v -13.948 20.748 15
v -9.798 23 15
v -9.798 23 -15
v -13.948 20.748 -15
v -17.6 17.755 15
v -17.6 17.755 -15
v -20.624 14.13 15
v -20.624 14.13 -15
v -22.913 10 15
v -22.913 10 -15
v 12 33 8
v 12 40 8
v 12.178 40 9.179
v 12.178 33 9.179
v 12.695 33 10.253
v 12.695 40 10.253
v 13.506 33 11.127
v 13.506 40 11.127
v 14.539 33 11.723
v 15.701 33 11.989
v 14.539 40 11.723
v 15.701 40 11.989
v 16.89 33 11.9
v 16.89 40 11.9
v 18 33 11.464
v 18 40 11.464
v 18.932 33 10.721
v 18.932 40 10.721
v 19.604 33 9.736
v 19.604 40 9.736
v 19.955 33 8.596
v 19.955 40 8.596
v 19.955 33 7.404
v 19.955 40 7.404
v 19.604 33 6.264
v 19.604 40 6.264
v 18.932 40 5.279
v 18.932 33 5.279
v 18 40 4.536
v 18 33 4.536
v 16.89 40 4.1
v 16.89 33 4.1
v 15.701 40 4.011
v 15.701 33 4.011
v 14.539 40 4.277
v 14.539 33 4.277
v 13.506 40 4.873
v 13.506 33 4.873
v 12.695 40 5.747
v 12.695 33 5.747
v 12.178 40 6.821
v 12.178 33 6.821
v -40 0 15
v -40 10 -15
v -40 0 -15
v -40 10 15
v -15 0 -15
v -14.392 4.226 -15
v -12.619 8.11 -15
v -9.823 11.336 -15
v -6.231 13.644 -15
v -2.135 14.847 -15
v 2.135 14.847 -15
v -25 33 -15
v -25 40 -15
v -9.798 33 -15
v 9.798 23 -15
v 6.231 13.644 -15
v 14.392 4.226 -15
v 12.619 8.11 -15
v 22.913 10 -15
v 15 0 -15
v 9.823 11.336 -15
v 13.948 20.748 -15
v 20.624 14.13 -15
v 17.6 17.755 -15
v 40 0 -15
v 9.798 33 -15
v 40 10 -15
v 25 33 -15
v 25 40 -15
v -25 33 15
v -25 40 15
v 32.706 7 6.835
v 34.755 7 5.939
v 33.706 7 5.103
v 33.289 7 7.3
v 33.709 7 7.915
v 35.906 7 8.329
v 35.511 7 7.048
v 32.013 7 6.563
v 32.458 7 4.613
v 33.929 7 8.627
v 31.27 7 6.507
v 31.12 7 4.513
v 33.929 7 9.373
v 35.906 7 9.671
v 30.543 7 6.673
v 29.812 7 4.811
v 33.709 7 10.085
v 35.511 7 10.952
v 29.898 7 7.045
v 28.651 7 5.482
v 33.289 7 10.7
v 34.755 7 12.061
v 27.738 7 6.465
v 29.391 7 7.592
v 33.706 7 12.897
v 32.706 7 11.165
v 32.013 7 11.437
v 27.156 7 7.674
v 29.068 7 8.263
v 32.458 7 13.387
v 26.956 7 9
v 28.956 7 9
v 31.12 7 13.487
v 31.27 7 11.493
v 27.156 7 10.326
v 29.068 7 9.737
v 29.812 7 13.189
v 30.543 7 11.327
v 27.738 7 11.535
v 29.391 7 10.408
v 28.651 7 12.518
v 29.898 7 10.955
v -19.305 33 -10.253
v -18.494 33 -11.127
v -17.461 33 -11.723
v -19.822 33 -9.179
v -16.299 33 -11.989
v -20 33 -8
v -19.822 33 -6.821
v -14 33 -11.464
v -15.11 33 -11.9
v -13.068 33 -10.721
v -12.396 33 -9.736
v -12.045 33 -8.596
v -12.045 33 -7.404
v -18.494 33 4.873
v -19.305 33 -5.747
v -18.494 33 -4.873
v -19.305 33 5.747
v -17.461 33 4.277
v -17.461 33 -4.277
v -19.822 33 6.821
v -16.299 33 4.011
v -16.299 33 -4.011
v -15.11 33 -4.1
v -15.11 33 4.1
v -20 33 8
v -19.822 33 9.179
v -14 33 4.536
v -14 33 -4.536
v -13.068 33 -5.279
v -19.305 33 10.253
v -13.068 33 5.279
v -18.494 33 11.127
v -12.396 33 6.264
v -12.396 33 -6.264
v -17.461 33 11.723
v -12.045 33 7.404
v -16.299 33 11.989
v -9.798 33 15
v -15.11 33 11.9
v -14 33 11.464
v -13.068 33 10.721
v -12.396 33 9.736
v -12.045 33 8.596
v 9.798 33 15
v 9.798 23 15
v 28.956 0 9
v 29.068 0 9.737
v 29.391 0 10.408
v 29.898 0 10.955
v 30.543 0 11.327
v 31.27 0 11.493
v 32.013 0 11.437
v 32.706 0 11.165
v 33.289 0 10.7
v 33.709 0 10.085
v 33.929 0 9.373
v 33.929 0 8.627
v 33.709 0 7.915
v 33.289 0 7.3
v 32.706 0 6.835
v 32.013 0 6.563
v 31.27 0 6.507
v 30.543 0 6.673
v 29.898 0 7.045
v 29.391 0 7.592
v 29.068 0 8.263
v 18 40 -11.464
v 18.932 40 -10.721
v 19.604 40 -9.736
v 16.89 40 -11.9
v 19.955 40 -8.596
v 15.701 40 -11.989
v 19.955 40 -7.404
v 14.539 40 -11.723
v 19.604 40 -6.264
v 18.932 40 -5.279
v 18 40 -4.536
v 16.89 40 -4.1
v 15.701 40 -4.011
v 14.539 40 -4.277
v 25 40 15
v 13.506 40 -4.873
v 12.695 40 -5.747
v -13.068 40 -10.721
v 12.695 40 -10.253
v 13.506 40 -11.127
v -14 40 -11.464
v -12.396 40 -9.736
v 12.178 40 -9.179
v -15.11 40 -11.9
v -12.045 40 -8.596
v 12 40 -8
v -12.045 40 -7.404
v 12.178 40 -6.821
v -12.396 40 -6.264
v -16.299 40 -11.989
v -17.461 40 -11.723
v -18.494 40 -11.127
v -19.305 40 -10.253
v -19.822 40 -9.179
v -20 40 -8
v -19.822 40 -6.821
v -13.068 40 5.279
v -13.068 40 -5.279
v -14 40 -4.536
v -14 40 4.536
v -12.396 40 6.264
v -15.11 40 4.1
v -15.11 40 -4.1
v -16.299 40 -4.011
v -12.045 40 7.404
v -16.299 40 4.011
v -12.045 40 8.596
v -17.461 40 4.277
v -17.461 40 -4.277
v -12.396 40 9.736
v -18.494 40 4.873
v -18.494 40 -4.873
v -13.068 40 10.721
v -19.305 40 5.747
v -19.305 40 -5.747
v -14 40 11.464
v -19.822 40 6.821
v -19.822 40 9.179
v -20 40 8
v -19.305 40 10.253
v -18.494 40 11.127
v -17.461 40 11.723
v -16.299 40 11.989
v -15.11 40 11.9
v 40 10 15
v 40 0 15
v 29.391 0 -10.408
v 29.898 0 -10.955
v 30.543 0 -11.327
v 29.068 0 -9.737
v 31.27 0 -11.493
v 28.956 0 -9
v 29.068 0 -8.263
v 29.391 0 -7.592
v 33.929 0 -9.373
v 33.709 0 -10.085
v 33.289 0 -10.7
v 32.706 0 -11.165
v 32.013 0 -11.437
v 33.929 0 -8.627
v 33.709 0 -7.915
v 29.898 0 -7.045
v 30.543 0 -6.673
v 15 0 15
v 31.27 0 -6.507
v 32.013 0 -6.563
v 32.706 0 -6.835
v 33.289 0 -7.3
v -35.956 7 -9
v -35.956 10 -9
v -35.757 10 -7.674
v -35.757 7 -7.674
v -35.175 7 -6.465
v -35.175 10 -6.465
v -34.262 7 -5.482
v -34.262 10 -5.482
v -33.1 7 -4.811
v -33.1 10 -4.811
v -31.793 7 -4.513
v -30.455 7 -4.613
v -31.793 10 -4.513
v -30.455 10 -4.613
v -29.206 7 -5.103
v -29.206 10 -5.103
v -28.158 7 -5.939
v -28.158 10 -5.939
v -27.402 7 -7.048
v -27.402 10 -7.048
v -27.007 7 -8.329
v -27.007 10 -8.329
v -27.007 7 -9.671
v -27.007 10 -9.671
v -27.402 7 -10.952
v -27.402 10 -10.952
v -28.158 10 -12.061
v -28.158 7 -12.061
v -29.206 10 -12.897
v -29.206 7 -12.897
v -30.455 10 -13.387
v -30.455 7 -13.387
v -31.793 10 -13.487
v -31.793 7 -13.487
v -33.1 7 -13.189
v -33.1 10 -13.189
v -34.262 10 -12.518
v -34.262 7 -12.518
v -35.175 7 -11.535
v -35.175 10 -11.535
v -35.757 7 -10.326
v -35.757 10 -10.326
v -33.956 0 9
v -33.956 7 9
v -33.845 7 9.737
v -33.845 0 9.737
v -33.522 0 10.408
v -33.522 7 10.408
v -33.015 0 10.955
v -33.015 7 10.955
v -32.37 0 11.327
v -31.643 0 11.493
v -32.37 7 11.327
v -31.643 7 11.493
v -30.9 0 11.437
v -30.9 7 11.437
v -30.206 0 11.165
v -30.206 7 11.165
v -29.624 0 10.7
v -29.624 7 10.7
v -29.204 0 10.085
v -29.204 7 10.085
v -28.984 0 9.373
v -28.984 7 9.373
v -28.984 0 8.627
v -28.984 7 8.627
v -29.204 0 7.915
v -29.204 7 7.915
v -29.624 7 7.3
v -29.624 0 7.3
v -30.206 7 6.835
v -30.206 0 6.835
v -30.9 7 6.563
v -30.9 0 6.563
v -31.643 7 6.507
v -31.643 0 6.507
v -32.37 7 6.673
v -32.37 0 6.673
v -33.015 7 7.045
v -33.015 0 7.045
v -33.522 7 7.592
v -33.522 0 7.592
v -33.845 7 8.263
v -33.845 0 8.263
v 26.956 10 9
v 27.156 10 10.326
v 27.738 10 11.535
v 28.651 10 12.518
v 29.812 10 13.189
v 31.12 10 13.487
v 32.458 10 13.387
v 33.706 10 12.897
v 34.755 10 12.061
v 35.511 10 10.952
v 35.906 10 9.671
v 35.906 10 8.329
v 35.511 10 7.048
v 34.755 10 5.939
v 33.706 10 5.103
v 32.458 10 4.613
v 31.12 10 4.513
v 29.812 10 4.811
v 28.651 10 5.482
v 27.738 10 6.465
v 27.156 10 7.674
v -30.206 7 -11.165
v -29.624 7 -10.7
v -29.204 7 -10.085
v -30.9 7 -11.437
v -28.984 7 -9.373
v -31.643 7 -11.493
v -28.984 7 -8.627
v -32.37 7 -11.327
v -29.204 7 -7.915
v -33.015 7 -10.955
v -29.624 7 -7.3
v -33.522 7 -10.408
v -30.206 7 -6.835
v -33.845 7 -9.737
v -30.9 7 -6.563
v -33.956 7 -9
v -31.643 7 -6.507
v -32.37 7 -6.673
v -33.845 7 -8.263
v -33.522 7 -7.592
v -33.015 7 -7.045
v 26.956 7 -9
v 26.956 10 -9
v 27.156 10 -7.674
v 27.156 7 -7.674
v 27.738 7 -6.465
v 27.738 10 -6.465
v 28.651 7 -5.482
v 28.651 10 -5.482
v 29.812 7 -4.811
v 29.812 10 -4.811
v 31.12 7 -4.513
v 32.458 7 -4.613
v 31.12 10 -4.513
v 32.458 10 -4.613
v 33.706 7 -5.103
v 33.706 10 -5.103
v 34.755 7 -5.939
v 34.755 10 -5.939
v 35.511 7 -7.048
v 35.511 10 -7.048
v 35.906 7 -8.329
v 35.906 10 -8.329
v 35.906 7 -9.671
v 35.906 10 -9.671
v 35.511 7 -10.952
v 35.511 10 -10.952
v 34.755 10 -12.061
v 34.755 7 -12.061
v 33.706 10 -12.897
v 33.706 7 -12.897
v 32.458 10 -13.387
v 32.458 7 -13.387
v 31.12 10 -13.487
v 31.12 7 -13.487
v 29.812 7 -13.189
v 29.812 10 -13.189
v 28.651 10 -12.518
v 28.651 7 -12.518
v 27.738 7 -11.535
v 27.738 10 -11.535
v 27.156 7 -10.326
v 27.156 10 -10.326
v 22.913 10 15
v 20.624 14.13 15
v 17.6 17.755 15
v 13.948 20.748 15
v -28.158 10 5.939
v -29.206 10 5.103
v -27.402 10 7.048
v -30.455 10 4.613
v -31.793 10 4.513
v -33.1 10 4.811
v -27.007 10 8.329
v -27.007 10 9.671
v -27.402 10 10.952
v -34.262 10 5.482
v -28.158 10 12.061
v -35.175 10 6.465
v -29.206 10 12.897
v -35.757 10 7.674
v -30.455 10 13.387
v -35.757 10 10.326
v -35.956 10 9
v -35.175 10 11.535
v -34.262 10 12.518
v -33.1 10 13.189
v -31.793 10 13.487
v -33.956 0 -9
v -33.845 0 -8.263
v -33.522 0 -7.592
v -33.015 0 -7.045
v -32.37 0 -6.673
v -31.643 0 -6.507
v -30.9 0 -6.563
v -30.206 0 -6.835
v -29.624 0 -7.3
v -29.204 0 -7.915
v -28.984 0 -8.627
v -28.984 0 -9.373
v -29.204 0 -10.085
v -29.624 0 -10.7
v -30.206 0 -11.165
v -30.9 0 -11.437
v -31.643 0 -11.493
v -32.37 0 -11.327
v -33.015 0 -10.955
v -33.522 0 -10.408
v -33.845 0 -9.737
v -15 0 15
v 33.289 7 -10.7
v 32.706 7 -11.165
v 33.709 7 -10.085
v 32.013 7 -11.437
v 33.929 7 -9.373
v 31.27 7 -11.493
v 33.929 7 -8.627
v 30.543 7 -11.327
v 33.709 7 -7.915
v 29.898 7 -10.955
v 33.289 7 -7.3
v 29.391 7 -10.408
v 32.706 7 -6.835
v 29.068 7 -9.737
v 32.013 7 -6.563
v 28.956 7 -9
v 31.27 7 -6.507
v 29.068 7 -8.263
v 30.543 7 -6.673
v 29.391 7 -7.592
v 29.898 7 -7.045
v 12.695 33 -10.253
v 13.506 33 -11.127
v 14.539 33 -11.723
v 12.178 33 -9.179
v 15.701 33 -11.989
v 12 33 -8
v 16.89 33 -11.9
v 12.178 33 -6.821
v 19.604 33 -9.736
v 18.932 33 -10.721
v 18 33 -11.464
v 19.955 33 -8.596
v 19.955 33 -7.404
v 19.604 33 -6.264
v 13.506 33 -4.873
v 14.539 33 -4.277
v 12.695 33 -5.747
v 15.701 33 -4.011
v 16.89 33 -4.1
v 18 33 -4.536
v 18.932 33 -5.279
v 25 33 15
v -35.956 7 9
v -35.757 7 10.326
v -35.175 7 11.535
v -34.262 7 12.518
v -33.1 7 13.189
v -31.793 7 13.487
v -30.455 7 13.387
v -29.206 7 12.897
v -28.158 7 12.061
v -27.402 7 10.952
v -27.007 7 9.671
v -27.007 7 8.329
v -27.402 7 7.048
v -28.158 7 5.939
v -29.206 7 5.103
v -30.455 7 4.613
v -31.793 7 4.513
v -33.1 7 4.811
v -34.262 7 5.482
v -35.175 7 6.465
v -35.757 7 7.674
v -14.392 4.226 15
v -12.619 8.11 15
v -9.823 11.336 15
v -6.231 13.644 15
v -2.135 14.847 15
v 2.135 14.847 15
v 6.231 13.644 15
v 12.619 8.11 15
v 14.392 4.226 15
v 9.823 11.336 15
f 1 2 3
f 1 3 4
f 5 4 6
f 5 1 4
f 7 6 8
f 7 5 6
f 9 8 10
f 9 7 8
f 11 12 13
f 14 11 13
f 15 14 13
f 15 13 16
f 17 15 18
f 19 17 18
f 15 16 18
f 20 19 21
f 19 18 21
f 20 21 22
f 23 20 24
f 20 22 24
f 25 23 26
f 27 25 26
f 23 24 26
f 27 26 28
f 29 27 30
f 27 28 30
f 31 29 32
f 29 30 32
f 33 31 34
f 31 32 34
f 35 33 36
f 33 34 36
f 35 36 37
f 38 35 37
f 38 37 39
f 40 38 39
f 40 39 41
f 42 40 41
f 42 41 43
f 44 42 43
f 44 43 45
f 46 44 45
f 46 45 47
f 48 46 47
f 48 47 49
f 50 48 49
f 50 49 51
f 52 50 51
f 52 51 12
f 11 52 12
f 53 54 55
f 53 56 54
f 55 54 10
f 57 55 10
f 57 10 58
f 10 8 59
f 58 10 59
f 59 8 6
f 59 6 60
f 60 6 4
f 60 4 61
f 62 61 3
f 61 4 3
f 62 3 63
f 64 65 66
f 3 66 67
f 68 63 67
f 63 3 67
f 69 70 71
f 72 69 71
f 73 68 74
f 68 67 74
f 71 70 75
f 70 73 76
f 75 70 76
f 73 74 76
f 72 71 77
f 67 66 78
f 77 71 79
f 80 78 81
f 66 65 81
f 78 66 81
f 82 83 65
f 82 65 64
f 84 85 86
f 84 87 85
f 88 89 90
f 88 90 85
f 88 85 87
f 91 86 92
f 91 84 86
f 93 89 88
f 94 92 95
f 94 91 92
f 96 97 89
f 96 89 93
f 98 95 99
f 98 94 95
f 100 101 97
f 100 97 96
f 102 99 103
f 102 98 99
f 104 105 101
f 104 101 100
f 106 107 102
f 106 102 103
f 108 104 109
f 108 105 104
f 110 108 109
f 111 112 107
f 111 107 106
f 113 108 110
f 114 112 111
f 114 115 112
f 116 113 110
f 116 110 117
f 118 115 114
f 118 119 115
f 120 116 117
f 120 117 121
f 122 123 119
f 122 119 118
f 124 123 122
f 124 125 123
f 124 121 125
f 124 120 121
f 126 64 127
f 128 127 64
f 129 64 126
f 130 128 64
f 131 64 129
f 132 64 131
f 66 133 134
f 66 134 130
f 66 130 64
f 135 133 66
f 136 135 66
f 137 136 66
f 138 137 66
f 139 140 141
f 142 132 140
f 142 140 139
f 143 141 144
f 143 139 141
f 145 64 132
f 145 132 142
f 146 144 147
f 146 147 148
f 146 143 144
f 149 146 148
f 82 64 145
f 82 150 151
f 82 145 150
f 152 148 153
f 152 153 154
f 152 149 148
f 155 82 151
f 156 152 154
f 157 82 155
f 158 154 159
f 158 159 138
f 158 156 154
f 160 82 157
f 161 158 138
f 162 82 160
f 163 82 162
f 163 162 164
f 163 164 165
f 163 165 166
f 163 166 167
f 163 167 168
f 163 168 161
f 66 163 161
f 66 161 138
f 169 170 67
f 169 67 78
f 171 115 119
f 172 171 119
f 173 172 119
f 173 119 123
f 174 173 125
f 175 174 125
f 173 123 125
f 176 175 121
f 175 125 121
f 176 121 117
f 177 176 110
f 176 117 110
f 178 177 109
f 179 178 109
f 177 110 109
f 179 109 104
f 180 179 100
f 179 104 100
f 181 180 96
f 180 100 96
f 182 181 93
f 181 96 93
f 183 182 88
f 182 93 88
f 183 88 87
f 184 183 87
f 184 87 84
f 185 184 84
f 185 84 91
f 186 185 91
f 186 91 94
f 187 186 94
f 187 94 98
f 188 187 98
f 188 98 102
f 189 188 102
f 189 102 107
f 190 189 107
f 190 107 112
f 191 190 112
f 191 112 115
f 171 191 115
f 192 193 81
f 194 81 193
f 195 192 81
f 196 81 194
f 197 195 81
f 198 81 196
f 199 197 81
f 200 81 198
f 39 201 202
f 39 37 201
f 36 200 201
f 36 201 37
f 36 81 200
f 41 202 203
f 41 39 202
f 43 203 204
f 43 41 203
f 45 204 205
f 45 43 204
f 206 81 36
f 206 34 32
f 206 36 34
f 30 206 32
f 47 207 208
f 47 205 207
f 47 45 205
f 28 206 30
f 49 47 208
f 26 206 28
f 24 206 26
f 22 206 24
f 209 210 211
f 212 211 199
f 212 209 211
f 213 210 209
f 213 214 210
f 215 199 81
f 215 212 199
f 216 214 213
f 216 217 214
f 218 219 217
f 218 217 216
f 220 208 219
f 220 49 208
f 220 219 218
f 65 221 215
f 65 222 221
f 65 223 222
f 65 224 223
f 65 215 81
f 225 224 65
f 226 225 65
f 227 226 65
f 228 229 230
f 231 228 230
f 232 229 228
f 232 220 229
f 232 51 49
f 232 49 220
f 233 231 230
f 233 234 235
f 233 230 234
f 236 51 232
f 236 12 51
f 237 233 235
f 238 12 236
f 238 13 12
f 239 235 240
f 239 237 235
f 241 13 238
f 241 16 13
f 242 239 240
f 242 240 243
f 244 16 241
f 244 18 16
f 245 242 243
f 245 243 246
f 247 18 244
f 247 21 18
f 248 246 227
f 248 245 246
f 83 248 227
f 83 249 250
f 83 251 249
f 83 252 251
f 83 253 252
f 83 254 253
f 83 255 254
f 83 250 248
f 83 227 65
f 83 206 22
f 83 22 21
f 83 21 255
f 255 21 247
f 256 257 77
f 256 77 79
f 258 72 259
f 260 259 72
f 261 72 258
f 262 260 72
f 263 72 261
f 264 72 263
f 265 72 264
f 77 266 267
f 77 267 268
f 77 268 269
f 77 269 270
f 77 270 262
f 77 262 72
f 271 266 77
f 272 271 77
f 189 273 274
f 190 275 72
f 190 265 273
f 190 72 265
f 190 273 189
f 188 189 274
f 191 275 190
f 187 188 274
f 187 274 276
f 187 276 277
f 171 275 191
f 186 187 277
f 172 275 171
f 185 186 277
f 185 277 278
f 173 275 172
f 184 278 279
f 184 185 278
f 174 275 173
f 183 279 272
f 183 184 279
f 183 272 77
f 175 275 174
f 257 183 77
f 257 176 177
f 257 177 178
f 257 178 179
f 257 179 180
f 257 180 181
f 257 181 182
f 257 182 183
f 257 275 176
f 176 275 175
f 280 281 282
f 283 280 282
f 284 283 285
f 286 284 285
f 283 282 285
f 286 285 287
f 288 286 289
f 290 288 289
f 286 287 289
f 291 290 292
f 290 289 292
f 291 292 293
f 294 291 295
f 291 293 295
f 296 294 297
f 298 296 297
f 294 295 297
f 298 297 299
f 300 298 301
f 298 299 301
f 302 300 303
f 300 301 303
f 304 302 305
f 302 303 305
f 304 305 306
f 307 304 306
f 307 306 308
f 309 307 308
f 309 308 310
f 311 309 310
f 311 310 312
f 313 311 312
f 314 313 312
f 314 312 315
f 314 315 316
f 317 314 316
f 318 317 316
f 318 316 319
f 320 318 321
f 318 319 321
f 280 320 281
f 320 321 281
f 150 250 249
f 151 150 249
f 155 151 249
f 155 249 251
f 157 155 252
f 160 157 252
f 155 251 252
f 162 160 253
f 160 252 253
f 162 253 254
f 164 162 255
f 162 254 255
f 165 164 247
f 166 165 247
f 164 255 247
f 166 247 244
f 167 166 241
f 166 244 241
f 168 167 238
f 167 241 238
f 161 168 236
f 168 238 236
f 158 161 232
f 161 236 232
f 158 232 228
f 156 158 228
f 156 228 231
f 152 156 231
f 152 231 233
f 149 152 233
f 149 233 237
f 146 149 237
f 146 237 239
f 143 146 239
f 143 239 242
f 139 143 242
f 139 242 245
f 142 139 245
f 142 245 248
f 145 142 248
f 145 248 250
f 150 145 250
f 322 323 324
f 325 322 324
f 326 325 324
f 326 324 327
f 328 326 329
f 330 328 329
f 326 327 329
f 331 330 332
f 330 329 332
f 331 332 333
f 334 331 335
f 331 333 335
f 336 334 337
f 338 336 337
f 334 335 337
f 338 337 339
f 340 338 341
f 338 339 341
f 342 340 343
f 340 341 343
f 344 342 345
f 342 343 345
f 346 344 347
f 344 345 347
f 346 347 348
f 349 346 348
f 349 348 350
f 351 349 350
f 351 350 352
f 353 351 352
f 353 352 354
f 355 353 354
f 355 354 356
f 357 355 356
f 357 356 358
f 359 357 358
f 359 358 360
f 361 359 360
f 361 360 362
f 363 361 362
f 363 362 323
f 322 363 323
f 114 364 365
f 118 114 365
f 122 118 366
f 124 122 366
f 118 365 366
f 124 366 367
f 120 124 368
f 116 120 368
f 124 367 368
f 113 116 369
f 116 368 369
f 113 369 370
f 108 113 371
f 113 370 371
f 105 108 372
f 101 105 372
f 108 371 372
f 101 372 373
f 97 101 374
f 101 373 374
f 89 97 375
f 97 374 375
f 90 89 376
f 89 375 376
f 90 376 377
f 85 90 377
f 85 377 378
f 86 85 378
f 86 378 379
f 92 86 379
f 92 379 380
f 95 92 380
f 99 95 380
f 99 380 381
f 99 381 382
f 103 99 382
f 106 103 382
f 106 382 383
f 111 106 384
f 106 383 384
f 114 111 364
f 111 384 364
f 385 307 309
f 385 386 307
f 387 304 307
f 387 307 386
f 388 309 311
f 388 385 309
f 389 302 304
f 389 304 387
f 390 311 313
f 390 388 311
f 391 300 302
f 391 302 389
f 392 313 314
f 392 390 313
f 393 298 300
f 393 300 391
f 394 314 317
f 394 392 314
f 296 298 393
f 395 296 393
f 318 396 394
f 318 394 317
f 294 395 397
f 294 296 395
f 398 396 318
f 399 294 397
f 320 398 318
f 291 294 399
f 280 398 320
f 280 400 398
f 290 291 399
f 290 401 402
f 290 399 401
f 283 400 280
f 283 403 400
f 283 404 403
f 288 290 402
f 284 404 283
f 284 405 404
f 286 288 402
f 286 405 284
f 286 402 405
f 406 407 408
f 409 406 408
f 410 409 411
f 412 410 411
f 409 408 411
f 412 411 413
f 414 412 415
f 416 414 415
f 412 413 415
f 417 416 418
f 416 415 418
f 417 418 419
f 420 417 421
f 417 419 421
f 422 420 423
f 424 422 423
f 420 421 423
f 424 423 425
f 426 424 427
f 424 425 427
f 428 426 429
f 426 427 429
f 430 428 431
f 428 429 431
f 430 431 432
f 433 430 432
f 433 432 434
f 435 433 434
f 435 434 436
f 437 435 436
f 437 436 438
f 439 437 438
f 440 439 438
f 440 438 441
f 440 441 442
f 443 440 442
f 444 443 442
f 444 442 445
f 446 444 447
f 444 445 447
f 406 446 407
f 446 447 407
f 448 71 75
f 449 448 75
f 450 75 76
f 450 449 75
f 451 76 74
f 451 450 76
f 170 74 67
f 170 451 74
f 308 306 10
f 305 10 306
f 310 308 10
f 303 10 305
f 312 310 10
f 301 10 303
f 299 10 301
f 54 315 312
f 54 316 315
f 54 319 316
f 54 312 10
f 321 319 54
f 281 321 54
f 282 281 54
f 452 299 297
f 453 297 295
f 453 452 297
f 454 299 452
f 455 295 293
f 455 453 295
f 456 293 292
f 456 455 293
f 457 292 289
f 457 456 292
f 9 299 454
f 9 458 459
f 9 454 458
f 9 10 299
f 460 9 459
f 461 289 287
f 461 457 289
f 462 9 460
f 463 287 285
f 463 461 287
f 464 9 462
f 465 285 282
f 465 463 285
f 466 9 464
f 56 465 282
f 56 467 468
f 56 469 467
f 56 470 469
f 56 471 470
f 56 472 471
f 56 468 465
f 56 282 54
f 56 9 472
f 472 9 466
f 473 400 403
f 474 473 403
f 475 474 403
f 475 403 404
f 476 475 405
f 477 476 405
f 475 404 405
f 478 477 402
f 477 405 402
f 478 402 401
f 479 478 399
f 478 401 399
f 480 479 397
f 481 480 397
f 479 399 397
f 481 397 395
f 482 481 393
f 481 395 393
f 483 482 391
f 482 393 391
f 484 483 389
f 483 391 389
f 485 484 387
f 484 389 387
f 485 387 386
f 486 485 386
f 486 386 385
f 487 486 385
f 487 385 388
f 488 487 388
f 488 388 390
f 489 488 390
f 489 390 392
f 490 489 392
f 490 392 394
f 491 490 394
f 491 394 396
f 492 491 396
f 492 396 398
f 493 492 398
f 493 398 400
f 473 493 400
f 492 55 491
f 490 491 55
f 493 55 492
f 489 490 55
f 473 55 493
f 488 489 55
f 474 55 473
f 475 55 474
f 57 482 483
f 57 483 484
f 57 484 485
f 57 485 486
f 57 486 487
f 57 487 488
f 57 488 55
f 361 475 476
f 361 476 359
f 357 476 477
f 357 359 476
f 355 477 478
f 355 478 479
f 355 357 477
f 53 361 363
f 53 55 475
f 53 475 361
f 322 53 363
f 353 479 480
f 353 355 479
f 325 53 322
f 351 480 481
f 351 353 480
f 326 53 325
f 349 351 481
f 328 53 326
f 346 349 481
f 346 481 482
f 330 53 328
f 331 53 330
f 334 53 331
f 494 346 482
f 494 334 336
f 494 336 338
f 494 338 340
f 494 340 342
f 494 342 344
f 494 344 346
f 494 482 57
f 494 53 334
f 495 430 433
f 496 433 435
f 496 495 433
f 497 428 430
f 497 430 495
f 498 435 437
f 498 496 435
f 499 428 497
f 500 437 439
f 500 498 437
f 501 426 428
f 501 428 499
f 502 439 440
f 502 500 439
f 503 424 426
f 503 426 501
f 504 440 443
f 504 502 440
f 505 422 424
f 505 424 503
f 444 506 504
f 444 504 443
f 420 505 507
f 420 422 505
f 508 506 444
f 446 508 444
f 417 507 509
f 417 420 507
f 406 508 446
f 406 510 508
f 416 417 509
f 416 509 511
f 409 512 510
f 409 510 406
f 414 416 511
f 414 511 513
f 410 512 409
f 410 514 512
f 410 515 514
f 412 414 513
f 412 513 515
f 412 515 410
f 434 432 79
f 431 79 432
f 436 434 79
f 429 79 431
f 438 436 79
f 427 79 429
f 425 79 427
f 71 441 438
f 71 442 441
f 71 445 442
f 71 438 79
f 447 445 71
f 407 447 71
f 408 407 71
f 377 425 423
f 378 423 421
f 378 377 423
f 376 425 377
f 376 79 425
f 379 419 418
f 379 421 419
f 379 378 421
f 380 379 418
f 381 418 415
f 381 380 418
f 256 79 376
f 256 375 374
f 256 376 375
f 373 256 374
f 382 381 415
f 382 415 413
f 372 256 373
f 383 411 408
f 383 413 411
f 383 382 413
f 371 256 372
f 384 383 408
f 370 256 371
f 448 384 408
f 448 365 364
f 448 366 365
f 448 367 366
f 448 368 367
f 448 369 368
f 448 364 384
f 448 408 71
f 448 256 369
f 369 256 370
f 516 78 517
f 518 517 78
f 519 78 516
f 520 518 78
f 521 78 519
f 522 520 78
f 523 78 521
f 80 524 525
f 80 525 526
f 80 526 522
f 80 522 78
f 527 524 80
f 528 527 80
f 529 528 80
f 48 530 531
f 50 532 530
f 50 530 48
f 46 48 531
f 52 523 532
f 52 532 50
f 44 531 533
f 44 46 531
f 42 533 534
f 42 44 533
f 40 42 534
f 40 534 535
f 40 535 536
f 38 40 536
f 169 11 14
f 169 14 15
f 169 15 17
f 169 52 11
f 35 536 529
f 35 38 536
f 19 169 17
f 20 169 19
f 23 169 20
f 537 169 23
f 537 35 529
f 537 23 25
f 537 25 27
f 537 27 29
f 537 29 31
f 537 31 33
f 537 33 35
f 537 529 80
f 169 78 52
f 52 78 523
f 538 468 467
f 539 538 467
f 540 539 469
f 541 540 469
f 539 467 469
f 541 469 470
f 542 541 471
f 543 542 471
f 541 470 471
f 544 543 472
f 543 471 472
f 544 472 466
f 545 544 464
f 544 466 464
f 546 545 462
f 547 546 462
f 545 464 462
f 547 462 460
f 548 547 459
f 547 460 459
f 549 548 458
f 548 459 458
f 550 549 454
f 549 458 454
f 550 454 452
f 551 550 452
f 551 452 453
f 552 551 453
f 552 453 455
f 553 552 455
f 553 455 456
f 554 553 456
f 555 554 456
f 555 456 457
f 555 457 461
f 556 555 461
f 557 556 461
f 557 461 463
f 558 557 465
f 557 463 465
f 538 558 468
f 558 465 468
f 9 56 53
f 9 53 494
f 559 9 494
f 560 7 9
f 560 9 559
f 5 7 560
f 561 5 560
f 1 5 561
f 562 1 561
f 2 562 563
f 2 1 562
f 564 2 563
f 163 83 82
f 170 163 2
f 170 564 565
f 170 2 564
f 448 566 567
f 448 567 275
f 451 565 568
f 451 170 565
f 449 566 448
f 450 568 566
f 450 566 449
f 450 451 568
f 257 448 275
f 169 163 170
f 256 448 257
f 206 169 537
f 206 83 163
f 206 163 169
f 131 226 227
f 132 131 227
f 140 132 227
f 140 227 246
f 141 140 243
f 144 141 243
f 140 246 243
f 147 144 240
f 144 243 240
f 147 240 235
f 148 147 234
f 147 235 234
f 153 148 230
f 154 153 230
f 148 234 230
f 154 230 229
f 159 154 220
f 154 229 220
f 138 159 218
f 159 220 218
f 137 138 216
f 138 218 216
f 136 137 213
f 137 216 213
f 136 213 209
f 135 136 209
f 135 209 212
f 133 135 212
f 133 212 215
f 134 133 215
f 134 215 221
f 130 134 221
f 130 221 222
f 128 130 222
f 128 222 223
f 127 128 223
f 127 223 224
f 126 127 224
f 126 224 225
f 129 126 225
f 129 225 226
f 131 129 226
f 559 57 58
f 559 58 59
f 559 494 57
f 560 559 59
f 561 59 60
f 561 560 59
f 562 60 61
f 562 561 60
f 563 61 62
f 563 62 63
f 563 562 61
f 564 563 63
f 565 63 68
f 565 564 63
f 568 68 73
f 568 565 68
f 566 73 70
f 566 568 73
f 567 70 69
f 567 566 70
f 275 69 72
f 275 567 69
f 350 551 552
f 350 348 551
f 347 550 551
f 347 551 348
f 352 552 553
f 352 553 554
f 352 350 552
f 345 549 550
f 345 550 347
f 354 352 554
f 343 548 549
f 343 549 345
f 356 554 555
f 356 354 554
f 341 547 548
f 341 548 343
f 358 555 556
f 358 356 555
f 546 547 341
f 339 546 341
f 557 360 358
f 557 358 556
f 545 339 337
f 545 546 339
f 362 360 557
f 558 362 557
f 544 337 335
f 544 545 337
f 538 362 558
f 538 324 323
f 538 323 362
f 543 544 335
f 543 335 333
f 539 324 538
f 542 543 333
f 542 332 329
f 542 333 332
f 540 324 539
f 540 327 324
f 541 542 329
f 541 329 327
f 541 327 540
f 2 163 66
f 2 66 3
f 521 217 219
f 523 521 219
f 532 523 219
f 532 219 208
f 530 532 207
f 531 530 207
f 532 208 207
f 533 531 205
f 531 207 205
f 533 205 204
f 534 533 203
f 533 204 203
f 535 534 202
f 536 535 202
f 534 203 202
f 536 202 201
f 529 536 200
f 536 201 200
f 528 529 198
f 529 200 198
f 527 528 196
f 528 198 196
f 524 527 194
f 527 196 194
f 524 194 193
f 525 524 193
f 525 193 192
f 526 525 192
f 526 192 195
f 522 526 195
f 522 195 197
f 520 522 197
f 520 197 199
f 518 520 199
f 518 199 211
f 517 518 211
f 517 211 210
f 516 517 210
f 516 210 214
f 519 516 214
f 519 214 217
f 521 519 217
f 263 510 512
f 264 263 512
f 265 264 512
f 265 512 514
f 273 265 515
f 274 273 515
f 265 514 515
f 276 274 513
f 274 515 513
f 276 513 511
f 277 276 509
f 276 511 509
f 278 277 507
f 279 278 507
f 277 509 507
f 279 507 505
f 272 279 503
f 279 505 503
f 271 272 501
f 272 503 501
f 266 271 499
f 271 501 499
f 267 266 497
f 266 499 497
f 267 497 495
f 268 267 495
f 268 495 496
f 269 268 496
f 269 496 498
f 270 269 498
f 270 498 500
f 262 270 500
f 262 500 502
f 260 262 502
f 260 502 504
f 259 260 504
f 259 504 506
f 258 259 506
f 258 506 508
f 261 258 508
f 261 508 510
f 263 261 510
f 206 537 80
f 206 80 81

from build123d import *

# Parameters (mm, degrees)
F1_DEPTH = 15
F2_R     = 2.5
F3_DEPTH = 15
F4_R     = 4.5
F4_R_2   = 2.5
F5_DEPTH = 3
F7_DEPTH = 30
F8_R     = 4
F9_DEPTH = 8


with BuildPart() as f1:
    # F0 (on Top) → F1 (new body, symmetric)
    with BuildSketch(Plane.XY):
        with BuildLine():
            ThreePointArc((-15, 0), (0, 15), (15, 0))
            Line((15, 0), (40, 0))
            Line((40, 0), (40, 10))
            Line((40, 10), (22.912878, 10))
            ThreePointArc((22.912878, 10), (0, 25), (-22.912878, 10))
            Line((-22.912878, 10), (-40, 10))
            Line((-40, 10), (-40, 0))
            Line((-40, 0), (-15, 0))
        make_face()
    extrude(amount=F1_DEPTH, both=True)

    # F2 (on face) → F3 (cut)
    with BuildSketch(Plane(origin=(0, 10, 0), x_dir=(-1, 0, 0), z_dir=(0, 1, 0))):
        with Locations((-31.456439, 9)):
            Circle(F2_R)
        with Locations((-31.456439, -9)):
            Circle(F2_R)
        with Locations((31.456439, -9)):
            Circle(F2_R)
        with Locations((31.456439, 9)):
            Circle(F2_R)
    extrude(amount=-F3_DEPTH, mode=Mode.SUBTRACT)

    # F4 (on face) → F5 (cut)
    with BuildSketch(Plane(origin=(0, 10, 0), x_dir=(-1, 0, 0), z_dir=(0, 1, 0))):
        with Locations((31.456439, 9)):
            Circle(F4_R)
        with Locations((31.456439, 9)):
            Circle(F4_R_2, mode=Mode.SUBTRACT)
        with Locations((31.456439, -9)):
            Circle(F4_R)
        with Locations((-31.456439, -9)):
            Circle(F4_R)
        with Locations((-31.456439, 9)):
            Circle(F4_R)
    extrude(amount=-F5_DEPTH, mode=Mode.SUBTRACT)

    # F6 (on face) → F7 (join)
    with BuildSketch(Plane.XY.offset(15)):
        Polygon((-9.797959, 33), (-9.797959, 23), (9.797959, 23), (9.797959, 33), (0, 33), align=None)
        Polygon((-25, 33), (-9.797959, 33), (0, 33), (0, 40), (-25, 40), align=None)
        Polygon((0, 33), (9.797959, 33), (25, 33), (25, 40), (0, 40), align=None)
    extrude(amount=-F7_DEPTH)

    # F8 (on face) → F9 (cut)
    with BuildSketch(Plane(origin=(0, 40, 0), x_dir=(-1, 0, 0), z_dir=(0, 1, 0))):
        with Locations((16, 8)):
            Circle(F8_R)
        with Locations((16, -8)):
            Circle(F8_R)
        with Locations((-16, -8)):
            Circle(F8_R)
        with Locations((-16, 8)):
            Circle(F8_R)
    extrude(amount=-F9_DEPTH, mode=Mode.SUBTRACT)


solid = f1.part
